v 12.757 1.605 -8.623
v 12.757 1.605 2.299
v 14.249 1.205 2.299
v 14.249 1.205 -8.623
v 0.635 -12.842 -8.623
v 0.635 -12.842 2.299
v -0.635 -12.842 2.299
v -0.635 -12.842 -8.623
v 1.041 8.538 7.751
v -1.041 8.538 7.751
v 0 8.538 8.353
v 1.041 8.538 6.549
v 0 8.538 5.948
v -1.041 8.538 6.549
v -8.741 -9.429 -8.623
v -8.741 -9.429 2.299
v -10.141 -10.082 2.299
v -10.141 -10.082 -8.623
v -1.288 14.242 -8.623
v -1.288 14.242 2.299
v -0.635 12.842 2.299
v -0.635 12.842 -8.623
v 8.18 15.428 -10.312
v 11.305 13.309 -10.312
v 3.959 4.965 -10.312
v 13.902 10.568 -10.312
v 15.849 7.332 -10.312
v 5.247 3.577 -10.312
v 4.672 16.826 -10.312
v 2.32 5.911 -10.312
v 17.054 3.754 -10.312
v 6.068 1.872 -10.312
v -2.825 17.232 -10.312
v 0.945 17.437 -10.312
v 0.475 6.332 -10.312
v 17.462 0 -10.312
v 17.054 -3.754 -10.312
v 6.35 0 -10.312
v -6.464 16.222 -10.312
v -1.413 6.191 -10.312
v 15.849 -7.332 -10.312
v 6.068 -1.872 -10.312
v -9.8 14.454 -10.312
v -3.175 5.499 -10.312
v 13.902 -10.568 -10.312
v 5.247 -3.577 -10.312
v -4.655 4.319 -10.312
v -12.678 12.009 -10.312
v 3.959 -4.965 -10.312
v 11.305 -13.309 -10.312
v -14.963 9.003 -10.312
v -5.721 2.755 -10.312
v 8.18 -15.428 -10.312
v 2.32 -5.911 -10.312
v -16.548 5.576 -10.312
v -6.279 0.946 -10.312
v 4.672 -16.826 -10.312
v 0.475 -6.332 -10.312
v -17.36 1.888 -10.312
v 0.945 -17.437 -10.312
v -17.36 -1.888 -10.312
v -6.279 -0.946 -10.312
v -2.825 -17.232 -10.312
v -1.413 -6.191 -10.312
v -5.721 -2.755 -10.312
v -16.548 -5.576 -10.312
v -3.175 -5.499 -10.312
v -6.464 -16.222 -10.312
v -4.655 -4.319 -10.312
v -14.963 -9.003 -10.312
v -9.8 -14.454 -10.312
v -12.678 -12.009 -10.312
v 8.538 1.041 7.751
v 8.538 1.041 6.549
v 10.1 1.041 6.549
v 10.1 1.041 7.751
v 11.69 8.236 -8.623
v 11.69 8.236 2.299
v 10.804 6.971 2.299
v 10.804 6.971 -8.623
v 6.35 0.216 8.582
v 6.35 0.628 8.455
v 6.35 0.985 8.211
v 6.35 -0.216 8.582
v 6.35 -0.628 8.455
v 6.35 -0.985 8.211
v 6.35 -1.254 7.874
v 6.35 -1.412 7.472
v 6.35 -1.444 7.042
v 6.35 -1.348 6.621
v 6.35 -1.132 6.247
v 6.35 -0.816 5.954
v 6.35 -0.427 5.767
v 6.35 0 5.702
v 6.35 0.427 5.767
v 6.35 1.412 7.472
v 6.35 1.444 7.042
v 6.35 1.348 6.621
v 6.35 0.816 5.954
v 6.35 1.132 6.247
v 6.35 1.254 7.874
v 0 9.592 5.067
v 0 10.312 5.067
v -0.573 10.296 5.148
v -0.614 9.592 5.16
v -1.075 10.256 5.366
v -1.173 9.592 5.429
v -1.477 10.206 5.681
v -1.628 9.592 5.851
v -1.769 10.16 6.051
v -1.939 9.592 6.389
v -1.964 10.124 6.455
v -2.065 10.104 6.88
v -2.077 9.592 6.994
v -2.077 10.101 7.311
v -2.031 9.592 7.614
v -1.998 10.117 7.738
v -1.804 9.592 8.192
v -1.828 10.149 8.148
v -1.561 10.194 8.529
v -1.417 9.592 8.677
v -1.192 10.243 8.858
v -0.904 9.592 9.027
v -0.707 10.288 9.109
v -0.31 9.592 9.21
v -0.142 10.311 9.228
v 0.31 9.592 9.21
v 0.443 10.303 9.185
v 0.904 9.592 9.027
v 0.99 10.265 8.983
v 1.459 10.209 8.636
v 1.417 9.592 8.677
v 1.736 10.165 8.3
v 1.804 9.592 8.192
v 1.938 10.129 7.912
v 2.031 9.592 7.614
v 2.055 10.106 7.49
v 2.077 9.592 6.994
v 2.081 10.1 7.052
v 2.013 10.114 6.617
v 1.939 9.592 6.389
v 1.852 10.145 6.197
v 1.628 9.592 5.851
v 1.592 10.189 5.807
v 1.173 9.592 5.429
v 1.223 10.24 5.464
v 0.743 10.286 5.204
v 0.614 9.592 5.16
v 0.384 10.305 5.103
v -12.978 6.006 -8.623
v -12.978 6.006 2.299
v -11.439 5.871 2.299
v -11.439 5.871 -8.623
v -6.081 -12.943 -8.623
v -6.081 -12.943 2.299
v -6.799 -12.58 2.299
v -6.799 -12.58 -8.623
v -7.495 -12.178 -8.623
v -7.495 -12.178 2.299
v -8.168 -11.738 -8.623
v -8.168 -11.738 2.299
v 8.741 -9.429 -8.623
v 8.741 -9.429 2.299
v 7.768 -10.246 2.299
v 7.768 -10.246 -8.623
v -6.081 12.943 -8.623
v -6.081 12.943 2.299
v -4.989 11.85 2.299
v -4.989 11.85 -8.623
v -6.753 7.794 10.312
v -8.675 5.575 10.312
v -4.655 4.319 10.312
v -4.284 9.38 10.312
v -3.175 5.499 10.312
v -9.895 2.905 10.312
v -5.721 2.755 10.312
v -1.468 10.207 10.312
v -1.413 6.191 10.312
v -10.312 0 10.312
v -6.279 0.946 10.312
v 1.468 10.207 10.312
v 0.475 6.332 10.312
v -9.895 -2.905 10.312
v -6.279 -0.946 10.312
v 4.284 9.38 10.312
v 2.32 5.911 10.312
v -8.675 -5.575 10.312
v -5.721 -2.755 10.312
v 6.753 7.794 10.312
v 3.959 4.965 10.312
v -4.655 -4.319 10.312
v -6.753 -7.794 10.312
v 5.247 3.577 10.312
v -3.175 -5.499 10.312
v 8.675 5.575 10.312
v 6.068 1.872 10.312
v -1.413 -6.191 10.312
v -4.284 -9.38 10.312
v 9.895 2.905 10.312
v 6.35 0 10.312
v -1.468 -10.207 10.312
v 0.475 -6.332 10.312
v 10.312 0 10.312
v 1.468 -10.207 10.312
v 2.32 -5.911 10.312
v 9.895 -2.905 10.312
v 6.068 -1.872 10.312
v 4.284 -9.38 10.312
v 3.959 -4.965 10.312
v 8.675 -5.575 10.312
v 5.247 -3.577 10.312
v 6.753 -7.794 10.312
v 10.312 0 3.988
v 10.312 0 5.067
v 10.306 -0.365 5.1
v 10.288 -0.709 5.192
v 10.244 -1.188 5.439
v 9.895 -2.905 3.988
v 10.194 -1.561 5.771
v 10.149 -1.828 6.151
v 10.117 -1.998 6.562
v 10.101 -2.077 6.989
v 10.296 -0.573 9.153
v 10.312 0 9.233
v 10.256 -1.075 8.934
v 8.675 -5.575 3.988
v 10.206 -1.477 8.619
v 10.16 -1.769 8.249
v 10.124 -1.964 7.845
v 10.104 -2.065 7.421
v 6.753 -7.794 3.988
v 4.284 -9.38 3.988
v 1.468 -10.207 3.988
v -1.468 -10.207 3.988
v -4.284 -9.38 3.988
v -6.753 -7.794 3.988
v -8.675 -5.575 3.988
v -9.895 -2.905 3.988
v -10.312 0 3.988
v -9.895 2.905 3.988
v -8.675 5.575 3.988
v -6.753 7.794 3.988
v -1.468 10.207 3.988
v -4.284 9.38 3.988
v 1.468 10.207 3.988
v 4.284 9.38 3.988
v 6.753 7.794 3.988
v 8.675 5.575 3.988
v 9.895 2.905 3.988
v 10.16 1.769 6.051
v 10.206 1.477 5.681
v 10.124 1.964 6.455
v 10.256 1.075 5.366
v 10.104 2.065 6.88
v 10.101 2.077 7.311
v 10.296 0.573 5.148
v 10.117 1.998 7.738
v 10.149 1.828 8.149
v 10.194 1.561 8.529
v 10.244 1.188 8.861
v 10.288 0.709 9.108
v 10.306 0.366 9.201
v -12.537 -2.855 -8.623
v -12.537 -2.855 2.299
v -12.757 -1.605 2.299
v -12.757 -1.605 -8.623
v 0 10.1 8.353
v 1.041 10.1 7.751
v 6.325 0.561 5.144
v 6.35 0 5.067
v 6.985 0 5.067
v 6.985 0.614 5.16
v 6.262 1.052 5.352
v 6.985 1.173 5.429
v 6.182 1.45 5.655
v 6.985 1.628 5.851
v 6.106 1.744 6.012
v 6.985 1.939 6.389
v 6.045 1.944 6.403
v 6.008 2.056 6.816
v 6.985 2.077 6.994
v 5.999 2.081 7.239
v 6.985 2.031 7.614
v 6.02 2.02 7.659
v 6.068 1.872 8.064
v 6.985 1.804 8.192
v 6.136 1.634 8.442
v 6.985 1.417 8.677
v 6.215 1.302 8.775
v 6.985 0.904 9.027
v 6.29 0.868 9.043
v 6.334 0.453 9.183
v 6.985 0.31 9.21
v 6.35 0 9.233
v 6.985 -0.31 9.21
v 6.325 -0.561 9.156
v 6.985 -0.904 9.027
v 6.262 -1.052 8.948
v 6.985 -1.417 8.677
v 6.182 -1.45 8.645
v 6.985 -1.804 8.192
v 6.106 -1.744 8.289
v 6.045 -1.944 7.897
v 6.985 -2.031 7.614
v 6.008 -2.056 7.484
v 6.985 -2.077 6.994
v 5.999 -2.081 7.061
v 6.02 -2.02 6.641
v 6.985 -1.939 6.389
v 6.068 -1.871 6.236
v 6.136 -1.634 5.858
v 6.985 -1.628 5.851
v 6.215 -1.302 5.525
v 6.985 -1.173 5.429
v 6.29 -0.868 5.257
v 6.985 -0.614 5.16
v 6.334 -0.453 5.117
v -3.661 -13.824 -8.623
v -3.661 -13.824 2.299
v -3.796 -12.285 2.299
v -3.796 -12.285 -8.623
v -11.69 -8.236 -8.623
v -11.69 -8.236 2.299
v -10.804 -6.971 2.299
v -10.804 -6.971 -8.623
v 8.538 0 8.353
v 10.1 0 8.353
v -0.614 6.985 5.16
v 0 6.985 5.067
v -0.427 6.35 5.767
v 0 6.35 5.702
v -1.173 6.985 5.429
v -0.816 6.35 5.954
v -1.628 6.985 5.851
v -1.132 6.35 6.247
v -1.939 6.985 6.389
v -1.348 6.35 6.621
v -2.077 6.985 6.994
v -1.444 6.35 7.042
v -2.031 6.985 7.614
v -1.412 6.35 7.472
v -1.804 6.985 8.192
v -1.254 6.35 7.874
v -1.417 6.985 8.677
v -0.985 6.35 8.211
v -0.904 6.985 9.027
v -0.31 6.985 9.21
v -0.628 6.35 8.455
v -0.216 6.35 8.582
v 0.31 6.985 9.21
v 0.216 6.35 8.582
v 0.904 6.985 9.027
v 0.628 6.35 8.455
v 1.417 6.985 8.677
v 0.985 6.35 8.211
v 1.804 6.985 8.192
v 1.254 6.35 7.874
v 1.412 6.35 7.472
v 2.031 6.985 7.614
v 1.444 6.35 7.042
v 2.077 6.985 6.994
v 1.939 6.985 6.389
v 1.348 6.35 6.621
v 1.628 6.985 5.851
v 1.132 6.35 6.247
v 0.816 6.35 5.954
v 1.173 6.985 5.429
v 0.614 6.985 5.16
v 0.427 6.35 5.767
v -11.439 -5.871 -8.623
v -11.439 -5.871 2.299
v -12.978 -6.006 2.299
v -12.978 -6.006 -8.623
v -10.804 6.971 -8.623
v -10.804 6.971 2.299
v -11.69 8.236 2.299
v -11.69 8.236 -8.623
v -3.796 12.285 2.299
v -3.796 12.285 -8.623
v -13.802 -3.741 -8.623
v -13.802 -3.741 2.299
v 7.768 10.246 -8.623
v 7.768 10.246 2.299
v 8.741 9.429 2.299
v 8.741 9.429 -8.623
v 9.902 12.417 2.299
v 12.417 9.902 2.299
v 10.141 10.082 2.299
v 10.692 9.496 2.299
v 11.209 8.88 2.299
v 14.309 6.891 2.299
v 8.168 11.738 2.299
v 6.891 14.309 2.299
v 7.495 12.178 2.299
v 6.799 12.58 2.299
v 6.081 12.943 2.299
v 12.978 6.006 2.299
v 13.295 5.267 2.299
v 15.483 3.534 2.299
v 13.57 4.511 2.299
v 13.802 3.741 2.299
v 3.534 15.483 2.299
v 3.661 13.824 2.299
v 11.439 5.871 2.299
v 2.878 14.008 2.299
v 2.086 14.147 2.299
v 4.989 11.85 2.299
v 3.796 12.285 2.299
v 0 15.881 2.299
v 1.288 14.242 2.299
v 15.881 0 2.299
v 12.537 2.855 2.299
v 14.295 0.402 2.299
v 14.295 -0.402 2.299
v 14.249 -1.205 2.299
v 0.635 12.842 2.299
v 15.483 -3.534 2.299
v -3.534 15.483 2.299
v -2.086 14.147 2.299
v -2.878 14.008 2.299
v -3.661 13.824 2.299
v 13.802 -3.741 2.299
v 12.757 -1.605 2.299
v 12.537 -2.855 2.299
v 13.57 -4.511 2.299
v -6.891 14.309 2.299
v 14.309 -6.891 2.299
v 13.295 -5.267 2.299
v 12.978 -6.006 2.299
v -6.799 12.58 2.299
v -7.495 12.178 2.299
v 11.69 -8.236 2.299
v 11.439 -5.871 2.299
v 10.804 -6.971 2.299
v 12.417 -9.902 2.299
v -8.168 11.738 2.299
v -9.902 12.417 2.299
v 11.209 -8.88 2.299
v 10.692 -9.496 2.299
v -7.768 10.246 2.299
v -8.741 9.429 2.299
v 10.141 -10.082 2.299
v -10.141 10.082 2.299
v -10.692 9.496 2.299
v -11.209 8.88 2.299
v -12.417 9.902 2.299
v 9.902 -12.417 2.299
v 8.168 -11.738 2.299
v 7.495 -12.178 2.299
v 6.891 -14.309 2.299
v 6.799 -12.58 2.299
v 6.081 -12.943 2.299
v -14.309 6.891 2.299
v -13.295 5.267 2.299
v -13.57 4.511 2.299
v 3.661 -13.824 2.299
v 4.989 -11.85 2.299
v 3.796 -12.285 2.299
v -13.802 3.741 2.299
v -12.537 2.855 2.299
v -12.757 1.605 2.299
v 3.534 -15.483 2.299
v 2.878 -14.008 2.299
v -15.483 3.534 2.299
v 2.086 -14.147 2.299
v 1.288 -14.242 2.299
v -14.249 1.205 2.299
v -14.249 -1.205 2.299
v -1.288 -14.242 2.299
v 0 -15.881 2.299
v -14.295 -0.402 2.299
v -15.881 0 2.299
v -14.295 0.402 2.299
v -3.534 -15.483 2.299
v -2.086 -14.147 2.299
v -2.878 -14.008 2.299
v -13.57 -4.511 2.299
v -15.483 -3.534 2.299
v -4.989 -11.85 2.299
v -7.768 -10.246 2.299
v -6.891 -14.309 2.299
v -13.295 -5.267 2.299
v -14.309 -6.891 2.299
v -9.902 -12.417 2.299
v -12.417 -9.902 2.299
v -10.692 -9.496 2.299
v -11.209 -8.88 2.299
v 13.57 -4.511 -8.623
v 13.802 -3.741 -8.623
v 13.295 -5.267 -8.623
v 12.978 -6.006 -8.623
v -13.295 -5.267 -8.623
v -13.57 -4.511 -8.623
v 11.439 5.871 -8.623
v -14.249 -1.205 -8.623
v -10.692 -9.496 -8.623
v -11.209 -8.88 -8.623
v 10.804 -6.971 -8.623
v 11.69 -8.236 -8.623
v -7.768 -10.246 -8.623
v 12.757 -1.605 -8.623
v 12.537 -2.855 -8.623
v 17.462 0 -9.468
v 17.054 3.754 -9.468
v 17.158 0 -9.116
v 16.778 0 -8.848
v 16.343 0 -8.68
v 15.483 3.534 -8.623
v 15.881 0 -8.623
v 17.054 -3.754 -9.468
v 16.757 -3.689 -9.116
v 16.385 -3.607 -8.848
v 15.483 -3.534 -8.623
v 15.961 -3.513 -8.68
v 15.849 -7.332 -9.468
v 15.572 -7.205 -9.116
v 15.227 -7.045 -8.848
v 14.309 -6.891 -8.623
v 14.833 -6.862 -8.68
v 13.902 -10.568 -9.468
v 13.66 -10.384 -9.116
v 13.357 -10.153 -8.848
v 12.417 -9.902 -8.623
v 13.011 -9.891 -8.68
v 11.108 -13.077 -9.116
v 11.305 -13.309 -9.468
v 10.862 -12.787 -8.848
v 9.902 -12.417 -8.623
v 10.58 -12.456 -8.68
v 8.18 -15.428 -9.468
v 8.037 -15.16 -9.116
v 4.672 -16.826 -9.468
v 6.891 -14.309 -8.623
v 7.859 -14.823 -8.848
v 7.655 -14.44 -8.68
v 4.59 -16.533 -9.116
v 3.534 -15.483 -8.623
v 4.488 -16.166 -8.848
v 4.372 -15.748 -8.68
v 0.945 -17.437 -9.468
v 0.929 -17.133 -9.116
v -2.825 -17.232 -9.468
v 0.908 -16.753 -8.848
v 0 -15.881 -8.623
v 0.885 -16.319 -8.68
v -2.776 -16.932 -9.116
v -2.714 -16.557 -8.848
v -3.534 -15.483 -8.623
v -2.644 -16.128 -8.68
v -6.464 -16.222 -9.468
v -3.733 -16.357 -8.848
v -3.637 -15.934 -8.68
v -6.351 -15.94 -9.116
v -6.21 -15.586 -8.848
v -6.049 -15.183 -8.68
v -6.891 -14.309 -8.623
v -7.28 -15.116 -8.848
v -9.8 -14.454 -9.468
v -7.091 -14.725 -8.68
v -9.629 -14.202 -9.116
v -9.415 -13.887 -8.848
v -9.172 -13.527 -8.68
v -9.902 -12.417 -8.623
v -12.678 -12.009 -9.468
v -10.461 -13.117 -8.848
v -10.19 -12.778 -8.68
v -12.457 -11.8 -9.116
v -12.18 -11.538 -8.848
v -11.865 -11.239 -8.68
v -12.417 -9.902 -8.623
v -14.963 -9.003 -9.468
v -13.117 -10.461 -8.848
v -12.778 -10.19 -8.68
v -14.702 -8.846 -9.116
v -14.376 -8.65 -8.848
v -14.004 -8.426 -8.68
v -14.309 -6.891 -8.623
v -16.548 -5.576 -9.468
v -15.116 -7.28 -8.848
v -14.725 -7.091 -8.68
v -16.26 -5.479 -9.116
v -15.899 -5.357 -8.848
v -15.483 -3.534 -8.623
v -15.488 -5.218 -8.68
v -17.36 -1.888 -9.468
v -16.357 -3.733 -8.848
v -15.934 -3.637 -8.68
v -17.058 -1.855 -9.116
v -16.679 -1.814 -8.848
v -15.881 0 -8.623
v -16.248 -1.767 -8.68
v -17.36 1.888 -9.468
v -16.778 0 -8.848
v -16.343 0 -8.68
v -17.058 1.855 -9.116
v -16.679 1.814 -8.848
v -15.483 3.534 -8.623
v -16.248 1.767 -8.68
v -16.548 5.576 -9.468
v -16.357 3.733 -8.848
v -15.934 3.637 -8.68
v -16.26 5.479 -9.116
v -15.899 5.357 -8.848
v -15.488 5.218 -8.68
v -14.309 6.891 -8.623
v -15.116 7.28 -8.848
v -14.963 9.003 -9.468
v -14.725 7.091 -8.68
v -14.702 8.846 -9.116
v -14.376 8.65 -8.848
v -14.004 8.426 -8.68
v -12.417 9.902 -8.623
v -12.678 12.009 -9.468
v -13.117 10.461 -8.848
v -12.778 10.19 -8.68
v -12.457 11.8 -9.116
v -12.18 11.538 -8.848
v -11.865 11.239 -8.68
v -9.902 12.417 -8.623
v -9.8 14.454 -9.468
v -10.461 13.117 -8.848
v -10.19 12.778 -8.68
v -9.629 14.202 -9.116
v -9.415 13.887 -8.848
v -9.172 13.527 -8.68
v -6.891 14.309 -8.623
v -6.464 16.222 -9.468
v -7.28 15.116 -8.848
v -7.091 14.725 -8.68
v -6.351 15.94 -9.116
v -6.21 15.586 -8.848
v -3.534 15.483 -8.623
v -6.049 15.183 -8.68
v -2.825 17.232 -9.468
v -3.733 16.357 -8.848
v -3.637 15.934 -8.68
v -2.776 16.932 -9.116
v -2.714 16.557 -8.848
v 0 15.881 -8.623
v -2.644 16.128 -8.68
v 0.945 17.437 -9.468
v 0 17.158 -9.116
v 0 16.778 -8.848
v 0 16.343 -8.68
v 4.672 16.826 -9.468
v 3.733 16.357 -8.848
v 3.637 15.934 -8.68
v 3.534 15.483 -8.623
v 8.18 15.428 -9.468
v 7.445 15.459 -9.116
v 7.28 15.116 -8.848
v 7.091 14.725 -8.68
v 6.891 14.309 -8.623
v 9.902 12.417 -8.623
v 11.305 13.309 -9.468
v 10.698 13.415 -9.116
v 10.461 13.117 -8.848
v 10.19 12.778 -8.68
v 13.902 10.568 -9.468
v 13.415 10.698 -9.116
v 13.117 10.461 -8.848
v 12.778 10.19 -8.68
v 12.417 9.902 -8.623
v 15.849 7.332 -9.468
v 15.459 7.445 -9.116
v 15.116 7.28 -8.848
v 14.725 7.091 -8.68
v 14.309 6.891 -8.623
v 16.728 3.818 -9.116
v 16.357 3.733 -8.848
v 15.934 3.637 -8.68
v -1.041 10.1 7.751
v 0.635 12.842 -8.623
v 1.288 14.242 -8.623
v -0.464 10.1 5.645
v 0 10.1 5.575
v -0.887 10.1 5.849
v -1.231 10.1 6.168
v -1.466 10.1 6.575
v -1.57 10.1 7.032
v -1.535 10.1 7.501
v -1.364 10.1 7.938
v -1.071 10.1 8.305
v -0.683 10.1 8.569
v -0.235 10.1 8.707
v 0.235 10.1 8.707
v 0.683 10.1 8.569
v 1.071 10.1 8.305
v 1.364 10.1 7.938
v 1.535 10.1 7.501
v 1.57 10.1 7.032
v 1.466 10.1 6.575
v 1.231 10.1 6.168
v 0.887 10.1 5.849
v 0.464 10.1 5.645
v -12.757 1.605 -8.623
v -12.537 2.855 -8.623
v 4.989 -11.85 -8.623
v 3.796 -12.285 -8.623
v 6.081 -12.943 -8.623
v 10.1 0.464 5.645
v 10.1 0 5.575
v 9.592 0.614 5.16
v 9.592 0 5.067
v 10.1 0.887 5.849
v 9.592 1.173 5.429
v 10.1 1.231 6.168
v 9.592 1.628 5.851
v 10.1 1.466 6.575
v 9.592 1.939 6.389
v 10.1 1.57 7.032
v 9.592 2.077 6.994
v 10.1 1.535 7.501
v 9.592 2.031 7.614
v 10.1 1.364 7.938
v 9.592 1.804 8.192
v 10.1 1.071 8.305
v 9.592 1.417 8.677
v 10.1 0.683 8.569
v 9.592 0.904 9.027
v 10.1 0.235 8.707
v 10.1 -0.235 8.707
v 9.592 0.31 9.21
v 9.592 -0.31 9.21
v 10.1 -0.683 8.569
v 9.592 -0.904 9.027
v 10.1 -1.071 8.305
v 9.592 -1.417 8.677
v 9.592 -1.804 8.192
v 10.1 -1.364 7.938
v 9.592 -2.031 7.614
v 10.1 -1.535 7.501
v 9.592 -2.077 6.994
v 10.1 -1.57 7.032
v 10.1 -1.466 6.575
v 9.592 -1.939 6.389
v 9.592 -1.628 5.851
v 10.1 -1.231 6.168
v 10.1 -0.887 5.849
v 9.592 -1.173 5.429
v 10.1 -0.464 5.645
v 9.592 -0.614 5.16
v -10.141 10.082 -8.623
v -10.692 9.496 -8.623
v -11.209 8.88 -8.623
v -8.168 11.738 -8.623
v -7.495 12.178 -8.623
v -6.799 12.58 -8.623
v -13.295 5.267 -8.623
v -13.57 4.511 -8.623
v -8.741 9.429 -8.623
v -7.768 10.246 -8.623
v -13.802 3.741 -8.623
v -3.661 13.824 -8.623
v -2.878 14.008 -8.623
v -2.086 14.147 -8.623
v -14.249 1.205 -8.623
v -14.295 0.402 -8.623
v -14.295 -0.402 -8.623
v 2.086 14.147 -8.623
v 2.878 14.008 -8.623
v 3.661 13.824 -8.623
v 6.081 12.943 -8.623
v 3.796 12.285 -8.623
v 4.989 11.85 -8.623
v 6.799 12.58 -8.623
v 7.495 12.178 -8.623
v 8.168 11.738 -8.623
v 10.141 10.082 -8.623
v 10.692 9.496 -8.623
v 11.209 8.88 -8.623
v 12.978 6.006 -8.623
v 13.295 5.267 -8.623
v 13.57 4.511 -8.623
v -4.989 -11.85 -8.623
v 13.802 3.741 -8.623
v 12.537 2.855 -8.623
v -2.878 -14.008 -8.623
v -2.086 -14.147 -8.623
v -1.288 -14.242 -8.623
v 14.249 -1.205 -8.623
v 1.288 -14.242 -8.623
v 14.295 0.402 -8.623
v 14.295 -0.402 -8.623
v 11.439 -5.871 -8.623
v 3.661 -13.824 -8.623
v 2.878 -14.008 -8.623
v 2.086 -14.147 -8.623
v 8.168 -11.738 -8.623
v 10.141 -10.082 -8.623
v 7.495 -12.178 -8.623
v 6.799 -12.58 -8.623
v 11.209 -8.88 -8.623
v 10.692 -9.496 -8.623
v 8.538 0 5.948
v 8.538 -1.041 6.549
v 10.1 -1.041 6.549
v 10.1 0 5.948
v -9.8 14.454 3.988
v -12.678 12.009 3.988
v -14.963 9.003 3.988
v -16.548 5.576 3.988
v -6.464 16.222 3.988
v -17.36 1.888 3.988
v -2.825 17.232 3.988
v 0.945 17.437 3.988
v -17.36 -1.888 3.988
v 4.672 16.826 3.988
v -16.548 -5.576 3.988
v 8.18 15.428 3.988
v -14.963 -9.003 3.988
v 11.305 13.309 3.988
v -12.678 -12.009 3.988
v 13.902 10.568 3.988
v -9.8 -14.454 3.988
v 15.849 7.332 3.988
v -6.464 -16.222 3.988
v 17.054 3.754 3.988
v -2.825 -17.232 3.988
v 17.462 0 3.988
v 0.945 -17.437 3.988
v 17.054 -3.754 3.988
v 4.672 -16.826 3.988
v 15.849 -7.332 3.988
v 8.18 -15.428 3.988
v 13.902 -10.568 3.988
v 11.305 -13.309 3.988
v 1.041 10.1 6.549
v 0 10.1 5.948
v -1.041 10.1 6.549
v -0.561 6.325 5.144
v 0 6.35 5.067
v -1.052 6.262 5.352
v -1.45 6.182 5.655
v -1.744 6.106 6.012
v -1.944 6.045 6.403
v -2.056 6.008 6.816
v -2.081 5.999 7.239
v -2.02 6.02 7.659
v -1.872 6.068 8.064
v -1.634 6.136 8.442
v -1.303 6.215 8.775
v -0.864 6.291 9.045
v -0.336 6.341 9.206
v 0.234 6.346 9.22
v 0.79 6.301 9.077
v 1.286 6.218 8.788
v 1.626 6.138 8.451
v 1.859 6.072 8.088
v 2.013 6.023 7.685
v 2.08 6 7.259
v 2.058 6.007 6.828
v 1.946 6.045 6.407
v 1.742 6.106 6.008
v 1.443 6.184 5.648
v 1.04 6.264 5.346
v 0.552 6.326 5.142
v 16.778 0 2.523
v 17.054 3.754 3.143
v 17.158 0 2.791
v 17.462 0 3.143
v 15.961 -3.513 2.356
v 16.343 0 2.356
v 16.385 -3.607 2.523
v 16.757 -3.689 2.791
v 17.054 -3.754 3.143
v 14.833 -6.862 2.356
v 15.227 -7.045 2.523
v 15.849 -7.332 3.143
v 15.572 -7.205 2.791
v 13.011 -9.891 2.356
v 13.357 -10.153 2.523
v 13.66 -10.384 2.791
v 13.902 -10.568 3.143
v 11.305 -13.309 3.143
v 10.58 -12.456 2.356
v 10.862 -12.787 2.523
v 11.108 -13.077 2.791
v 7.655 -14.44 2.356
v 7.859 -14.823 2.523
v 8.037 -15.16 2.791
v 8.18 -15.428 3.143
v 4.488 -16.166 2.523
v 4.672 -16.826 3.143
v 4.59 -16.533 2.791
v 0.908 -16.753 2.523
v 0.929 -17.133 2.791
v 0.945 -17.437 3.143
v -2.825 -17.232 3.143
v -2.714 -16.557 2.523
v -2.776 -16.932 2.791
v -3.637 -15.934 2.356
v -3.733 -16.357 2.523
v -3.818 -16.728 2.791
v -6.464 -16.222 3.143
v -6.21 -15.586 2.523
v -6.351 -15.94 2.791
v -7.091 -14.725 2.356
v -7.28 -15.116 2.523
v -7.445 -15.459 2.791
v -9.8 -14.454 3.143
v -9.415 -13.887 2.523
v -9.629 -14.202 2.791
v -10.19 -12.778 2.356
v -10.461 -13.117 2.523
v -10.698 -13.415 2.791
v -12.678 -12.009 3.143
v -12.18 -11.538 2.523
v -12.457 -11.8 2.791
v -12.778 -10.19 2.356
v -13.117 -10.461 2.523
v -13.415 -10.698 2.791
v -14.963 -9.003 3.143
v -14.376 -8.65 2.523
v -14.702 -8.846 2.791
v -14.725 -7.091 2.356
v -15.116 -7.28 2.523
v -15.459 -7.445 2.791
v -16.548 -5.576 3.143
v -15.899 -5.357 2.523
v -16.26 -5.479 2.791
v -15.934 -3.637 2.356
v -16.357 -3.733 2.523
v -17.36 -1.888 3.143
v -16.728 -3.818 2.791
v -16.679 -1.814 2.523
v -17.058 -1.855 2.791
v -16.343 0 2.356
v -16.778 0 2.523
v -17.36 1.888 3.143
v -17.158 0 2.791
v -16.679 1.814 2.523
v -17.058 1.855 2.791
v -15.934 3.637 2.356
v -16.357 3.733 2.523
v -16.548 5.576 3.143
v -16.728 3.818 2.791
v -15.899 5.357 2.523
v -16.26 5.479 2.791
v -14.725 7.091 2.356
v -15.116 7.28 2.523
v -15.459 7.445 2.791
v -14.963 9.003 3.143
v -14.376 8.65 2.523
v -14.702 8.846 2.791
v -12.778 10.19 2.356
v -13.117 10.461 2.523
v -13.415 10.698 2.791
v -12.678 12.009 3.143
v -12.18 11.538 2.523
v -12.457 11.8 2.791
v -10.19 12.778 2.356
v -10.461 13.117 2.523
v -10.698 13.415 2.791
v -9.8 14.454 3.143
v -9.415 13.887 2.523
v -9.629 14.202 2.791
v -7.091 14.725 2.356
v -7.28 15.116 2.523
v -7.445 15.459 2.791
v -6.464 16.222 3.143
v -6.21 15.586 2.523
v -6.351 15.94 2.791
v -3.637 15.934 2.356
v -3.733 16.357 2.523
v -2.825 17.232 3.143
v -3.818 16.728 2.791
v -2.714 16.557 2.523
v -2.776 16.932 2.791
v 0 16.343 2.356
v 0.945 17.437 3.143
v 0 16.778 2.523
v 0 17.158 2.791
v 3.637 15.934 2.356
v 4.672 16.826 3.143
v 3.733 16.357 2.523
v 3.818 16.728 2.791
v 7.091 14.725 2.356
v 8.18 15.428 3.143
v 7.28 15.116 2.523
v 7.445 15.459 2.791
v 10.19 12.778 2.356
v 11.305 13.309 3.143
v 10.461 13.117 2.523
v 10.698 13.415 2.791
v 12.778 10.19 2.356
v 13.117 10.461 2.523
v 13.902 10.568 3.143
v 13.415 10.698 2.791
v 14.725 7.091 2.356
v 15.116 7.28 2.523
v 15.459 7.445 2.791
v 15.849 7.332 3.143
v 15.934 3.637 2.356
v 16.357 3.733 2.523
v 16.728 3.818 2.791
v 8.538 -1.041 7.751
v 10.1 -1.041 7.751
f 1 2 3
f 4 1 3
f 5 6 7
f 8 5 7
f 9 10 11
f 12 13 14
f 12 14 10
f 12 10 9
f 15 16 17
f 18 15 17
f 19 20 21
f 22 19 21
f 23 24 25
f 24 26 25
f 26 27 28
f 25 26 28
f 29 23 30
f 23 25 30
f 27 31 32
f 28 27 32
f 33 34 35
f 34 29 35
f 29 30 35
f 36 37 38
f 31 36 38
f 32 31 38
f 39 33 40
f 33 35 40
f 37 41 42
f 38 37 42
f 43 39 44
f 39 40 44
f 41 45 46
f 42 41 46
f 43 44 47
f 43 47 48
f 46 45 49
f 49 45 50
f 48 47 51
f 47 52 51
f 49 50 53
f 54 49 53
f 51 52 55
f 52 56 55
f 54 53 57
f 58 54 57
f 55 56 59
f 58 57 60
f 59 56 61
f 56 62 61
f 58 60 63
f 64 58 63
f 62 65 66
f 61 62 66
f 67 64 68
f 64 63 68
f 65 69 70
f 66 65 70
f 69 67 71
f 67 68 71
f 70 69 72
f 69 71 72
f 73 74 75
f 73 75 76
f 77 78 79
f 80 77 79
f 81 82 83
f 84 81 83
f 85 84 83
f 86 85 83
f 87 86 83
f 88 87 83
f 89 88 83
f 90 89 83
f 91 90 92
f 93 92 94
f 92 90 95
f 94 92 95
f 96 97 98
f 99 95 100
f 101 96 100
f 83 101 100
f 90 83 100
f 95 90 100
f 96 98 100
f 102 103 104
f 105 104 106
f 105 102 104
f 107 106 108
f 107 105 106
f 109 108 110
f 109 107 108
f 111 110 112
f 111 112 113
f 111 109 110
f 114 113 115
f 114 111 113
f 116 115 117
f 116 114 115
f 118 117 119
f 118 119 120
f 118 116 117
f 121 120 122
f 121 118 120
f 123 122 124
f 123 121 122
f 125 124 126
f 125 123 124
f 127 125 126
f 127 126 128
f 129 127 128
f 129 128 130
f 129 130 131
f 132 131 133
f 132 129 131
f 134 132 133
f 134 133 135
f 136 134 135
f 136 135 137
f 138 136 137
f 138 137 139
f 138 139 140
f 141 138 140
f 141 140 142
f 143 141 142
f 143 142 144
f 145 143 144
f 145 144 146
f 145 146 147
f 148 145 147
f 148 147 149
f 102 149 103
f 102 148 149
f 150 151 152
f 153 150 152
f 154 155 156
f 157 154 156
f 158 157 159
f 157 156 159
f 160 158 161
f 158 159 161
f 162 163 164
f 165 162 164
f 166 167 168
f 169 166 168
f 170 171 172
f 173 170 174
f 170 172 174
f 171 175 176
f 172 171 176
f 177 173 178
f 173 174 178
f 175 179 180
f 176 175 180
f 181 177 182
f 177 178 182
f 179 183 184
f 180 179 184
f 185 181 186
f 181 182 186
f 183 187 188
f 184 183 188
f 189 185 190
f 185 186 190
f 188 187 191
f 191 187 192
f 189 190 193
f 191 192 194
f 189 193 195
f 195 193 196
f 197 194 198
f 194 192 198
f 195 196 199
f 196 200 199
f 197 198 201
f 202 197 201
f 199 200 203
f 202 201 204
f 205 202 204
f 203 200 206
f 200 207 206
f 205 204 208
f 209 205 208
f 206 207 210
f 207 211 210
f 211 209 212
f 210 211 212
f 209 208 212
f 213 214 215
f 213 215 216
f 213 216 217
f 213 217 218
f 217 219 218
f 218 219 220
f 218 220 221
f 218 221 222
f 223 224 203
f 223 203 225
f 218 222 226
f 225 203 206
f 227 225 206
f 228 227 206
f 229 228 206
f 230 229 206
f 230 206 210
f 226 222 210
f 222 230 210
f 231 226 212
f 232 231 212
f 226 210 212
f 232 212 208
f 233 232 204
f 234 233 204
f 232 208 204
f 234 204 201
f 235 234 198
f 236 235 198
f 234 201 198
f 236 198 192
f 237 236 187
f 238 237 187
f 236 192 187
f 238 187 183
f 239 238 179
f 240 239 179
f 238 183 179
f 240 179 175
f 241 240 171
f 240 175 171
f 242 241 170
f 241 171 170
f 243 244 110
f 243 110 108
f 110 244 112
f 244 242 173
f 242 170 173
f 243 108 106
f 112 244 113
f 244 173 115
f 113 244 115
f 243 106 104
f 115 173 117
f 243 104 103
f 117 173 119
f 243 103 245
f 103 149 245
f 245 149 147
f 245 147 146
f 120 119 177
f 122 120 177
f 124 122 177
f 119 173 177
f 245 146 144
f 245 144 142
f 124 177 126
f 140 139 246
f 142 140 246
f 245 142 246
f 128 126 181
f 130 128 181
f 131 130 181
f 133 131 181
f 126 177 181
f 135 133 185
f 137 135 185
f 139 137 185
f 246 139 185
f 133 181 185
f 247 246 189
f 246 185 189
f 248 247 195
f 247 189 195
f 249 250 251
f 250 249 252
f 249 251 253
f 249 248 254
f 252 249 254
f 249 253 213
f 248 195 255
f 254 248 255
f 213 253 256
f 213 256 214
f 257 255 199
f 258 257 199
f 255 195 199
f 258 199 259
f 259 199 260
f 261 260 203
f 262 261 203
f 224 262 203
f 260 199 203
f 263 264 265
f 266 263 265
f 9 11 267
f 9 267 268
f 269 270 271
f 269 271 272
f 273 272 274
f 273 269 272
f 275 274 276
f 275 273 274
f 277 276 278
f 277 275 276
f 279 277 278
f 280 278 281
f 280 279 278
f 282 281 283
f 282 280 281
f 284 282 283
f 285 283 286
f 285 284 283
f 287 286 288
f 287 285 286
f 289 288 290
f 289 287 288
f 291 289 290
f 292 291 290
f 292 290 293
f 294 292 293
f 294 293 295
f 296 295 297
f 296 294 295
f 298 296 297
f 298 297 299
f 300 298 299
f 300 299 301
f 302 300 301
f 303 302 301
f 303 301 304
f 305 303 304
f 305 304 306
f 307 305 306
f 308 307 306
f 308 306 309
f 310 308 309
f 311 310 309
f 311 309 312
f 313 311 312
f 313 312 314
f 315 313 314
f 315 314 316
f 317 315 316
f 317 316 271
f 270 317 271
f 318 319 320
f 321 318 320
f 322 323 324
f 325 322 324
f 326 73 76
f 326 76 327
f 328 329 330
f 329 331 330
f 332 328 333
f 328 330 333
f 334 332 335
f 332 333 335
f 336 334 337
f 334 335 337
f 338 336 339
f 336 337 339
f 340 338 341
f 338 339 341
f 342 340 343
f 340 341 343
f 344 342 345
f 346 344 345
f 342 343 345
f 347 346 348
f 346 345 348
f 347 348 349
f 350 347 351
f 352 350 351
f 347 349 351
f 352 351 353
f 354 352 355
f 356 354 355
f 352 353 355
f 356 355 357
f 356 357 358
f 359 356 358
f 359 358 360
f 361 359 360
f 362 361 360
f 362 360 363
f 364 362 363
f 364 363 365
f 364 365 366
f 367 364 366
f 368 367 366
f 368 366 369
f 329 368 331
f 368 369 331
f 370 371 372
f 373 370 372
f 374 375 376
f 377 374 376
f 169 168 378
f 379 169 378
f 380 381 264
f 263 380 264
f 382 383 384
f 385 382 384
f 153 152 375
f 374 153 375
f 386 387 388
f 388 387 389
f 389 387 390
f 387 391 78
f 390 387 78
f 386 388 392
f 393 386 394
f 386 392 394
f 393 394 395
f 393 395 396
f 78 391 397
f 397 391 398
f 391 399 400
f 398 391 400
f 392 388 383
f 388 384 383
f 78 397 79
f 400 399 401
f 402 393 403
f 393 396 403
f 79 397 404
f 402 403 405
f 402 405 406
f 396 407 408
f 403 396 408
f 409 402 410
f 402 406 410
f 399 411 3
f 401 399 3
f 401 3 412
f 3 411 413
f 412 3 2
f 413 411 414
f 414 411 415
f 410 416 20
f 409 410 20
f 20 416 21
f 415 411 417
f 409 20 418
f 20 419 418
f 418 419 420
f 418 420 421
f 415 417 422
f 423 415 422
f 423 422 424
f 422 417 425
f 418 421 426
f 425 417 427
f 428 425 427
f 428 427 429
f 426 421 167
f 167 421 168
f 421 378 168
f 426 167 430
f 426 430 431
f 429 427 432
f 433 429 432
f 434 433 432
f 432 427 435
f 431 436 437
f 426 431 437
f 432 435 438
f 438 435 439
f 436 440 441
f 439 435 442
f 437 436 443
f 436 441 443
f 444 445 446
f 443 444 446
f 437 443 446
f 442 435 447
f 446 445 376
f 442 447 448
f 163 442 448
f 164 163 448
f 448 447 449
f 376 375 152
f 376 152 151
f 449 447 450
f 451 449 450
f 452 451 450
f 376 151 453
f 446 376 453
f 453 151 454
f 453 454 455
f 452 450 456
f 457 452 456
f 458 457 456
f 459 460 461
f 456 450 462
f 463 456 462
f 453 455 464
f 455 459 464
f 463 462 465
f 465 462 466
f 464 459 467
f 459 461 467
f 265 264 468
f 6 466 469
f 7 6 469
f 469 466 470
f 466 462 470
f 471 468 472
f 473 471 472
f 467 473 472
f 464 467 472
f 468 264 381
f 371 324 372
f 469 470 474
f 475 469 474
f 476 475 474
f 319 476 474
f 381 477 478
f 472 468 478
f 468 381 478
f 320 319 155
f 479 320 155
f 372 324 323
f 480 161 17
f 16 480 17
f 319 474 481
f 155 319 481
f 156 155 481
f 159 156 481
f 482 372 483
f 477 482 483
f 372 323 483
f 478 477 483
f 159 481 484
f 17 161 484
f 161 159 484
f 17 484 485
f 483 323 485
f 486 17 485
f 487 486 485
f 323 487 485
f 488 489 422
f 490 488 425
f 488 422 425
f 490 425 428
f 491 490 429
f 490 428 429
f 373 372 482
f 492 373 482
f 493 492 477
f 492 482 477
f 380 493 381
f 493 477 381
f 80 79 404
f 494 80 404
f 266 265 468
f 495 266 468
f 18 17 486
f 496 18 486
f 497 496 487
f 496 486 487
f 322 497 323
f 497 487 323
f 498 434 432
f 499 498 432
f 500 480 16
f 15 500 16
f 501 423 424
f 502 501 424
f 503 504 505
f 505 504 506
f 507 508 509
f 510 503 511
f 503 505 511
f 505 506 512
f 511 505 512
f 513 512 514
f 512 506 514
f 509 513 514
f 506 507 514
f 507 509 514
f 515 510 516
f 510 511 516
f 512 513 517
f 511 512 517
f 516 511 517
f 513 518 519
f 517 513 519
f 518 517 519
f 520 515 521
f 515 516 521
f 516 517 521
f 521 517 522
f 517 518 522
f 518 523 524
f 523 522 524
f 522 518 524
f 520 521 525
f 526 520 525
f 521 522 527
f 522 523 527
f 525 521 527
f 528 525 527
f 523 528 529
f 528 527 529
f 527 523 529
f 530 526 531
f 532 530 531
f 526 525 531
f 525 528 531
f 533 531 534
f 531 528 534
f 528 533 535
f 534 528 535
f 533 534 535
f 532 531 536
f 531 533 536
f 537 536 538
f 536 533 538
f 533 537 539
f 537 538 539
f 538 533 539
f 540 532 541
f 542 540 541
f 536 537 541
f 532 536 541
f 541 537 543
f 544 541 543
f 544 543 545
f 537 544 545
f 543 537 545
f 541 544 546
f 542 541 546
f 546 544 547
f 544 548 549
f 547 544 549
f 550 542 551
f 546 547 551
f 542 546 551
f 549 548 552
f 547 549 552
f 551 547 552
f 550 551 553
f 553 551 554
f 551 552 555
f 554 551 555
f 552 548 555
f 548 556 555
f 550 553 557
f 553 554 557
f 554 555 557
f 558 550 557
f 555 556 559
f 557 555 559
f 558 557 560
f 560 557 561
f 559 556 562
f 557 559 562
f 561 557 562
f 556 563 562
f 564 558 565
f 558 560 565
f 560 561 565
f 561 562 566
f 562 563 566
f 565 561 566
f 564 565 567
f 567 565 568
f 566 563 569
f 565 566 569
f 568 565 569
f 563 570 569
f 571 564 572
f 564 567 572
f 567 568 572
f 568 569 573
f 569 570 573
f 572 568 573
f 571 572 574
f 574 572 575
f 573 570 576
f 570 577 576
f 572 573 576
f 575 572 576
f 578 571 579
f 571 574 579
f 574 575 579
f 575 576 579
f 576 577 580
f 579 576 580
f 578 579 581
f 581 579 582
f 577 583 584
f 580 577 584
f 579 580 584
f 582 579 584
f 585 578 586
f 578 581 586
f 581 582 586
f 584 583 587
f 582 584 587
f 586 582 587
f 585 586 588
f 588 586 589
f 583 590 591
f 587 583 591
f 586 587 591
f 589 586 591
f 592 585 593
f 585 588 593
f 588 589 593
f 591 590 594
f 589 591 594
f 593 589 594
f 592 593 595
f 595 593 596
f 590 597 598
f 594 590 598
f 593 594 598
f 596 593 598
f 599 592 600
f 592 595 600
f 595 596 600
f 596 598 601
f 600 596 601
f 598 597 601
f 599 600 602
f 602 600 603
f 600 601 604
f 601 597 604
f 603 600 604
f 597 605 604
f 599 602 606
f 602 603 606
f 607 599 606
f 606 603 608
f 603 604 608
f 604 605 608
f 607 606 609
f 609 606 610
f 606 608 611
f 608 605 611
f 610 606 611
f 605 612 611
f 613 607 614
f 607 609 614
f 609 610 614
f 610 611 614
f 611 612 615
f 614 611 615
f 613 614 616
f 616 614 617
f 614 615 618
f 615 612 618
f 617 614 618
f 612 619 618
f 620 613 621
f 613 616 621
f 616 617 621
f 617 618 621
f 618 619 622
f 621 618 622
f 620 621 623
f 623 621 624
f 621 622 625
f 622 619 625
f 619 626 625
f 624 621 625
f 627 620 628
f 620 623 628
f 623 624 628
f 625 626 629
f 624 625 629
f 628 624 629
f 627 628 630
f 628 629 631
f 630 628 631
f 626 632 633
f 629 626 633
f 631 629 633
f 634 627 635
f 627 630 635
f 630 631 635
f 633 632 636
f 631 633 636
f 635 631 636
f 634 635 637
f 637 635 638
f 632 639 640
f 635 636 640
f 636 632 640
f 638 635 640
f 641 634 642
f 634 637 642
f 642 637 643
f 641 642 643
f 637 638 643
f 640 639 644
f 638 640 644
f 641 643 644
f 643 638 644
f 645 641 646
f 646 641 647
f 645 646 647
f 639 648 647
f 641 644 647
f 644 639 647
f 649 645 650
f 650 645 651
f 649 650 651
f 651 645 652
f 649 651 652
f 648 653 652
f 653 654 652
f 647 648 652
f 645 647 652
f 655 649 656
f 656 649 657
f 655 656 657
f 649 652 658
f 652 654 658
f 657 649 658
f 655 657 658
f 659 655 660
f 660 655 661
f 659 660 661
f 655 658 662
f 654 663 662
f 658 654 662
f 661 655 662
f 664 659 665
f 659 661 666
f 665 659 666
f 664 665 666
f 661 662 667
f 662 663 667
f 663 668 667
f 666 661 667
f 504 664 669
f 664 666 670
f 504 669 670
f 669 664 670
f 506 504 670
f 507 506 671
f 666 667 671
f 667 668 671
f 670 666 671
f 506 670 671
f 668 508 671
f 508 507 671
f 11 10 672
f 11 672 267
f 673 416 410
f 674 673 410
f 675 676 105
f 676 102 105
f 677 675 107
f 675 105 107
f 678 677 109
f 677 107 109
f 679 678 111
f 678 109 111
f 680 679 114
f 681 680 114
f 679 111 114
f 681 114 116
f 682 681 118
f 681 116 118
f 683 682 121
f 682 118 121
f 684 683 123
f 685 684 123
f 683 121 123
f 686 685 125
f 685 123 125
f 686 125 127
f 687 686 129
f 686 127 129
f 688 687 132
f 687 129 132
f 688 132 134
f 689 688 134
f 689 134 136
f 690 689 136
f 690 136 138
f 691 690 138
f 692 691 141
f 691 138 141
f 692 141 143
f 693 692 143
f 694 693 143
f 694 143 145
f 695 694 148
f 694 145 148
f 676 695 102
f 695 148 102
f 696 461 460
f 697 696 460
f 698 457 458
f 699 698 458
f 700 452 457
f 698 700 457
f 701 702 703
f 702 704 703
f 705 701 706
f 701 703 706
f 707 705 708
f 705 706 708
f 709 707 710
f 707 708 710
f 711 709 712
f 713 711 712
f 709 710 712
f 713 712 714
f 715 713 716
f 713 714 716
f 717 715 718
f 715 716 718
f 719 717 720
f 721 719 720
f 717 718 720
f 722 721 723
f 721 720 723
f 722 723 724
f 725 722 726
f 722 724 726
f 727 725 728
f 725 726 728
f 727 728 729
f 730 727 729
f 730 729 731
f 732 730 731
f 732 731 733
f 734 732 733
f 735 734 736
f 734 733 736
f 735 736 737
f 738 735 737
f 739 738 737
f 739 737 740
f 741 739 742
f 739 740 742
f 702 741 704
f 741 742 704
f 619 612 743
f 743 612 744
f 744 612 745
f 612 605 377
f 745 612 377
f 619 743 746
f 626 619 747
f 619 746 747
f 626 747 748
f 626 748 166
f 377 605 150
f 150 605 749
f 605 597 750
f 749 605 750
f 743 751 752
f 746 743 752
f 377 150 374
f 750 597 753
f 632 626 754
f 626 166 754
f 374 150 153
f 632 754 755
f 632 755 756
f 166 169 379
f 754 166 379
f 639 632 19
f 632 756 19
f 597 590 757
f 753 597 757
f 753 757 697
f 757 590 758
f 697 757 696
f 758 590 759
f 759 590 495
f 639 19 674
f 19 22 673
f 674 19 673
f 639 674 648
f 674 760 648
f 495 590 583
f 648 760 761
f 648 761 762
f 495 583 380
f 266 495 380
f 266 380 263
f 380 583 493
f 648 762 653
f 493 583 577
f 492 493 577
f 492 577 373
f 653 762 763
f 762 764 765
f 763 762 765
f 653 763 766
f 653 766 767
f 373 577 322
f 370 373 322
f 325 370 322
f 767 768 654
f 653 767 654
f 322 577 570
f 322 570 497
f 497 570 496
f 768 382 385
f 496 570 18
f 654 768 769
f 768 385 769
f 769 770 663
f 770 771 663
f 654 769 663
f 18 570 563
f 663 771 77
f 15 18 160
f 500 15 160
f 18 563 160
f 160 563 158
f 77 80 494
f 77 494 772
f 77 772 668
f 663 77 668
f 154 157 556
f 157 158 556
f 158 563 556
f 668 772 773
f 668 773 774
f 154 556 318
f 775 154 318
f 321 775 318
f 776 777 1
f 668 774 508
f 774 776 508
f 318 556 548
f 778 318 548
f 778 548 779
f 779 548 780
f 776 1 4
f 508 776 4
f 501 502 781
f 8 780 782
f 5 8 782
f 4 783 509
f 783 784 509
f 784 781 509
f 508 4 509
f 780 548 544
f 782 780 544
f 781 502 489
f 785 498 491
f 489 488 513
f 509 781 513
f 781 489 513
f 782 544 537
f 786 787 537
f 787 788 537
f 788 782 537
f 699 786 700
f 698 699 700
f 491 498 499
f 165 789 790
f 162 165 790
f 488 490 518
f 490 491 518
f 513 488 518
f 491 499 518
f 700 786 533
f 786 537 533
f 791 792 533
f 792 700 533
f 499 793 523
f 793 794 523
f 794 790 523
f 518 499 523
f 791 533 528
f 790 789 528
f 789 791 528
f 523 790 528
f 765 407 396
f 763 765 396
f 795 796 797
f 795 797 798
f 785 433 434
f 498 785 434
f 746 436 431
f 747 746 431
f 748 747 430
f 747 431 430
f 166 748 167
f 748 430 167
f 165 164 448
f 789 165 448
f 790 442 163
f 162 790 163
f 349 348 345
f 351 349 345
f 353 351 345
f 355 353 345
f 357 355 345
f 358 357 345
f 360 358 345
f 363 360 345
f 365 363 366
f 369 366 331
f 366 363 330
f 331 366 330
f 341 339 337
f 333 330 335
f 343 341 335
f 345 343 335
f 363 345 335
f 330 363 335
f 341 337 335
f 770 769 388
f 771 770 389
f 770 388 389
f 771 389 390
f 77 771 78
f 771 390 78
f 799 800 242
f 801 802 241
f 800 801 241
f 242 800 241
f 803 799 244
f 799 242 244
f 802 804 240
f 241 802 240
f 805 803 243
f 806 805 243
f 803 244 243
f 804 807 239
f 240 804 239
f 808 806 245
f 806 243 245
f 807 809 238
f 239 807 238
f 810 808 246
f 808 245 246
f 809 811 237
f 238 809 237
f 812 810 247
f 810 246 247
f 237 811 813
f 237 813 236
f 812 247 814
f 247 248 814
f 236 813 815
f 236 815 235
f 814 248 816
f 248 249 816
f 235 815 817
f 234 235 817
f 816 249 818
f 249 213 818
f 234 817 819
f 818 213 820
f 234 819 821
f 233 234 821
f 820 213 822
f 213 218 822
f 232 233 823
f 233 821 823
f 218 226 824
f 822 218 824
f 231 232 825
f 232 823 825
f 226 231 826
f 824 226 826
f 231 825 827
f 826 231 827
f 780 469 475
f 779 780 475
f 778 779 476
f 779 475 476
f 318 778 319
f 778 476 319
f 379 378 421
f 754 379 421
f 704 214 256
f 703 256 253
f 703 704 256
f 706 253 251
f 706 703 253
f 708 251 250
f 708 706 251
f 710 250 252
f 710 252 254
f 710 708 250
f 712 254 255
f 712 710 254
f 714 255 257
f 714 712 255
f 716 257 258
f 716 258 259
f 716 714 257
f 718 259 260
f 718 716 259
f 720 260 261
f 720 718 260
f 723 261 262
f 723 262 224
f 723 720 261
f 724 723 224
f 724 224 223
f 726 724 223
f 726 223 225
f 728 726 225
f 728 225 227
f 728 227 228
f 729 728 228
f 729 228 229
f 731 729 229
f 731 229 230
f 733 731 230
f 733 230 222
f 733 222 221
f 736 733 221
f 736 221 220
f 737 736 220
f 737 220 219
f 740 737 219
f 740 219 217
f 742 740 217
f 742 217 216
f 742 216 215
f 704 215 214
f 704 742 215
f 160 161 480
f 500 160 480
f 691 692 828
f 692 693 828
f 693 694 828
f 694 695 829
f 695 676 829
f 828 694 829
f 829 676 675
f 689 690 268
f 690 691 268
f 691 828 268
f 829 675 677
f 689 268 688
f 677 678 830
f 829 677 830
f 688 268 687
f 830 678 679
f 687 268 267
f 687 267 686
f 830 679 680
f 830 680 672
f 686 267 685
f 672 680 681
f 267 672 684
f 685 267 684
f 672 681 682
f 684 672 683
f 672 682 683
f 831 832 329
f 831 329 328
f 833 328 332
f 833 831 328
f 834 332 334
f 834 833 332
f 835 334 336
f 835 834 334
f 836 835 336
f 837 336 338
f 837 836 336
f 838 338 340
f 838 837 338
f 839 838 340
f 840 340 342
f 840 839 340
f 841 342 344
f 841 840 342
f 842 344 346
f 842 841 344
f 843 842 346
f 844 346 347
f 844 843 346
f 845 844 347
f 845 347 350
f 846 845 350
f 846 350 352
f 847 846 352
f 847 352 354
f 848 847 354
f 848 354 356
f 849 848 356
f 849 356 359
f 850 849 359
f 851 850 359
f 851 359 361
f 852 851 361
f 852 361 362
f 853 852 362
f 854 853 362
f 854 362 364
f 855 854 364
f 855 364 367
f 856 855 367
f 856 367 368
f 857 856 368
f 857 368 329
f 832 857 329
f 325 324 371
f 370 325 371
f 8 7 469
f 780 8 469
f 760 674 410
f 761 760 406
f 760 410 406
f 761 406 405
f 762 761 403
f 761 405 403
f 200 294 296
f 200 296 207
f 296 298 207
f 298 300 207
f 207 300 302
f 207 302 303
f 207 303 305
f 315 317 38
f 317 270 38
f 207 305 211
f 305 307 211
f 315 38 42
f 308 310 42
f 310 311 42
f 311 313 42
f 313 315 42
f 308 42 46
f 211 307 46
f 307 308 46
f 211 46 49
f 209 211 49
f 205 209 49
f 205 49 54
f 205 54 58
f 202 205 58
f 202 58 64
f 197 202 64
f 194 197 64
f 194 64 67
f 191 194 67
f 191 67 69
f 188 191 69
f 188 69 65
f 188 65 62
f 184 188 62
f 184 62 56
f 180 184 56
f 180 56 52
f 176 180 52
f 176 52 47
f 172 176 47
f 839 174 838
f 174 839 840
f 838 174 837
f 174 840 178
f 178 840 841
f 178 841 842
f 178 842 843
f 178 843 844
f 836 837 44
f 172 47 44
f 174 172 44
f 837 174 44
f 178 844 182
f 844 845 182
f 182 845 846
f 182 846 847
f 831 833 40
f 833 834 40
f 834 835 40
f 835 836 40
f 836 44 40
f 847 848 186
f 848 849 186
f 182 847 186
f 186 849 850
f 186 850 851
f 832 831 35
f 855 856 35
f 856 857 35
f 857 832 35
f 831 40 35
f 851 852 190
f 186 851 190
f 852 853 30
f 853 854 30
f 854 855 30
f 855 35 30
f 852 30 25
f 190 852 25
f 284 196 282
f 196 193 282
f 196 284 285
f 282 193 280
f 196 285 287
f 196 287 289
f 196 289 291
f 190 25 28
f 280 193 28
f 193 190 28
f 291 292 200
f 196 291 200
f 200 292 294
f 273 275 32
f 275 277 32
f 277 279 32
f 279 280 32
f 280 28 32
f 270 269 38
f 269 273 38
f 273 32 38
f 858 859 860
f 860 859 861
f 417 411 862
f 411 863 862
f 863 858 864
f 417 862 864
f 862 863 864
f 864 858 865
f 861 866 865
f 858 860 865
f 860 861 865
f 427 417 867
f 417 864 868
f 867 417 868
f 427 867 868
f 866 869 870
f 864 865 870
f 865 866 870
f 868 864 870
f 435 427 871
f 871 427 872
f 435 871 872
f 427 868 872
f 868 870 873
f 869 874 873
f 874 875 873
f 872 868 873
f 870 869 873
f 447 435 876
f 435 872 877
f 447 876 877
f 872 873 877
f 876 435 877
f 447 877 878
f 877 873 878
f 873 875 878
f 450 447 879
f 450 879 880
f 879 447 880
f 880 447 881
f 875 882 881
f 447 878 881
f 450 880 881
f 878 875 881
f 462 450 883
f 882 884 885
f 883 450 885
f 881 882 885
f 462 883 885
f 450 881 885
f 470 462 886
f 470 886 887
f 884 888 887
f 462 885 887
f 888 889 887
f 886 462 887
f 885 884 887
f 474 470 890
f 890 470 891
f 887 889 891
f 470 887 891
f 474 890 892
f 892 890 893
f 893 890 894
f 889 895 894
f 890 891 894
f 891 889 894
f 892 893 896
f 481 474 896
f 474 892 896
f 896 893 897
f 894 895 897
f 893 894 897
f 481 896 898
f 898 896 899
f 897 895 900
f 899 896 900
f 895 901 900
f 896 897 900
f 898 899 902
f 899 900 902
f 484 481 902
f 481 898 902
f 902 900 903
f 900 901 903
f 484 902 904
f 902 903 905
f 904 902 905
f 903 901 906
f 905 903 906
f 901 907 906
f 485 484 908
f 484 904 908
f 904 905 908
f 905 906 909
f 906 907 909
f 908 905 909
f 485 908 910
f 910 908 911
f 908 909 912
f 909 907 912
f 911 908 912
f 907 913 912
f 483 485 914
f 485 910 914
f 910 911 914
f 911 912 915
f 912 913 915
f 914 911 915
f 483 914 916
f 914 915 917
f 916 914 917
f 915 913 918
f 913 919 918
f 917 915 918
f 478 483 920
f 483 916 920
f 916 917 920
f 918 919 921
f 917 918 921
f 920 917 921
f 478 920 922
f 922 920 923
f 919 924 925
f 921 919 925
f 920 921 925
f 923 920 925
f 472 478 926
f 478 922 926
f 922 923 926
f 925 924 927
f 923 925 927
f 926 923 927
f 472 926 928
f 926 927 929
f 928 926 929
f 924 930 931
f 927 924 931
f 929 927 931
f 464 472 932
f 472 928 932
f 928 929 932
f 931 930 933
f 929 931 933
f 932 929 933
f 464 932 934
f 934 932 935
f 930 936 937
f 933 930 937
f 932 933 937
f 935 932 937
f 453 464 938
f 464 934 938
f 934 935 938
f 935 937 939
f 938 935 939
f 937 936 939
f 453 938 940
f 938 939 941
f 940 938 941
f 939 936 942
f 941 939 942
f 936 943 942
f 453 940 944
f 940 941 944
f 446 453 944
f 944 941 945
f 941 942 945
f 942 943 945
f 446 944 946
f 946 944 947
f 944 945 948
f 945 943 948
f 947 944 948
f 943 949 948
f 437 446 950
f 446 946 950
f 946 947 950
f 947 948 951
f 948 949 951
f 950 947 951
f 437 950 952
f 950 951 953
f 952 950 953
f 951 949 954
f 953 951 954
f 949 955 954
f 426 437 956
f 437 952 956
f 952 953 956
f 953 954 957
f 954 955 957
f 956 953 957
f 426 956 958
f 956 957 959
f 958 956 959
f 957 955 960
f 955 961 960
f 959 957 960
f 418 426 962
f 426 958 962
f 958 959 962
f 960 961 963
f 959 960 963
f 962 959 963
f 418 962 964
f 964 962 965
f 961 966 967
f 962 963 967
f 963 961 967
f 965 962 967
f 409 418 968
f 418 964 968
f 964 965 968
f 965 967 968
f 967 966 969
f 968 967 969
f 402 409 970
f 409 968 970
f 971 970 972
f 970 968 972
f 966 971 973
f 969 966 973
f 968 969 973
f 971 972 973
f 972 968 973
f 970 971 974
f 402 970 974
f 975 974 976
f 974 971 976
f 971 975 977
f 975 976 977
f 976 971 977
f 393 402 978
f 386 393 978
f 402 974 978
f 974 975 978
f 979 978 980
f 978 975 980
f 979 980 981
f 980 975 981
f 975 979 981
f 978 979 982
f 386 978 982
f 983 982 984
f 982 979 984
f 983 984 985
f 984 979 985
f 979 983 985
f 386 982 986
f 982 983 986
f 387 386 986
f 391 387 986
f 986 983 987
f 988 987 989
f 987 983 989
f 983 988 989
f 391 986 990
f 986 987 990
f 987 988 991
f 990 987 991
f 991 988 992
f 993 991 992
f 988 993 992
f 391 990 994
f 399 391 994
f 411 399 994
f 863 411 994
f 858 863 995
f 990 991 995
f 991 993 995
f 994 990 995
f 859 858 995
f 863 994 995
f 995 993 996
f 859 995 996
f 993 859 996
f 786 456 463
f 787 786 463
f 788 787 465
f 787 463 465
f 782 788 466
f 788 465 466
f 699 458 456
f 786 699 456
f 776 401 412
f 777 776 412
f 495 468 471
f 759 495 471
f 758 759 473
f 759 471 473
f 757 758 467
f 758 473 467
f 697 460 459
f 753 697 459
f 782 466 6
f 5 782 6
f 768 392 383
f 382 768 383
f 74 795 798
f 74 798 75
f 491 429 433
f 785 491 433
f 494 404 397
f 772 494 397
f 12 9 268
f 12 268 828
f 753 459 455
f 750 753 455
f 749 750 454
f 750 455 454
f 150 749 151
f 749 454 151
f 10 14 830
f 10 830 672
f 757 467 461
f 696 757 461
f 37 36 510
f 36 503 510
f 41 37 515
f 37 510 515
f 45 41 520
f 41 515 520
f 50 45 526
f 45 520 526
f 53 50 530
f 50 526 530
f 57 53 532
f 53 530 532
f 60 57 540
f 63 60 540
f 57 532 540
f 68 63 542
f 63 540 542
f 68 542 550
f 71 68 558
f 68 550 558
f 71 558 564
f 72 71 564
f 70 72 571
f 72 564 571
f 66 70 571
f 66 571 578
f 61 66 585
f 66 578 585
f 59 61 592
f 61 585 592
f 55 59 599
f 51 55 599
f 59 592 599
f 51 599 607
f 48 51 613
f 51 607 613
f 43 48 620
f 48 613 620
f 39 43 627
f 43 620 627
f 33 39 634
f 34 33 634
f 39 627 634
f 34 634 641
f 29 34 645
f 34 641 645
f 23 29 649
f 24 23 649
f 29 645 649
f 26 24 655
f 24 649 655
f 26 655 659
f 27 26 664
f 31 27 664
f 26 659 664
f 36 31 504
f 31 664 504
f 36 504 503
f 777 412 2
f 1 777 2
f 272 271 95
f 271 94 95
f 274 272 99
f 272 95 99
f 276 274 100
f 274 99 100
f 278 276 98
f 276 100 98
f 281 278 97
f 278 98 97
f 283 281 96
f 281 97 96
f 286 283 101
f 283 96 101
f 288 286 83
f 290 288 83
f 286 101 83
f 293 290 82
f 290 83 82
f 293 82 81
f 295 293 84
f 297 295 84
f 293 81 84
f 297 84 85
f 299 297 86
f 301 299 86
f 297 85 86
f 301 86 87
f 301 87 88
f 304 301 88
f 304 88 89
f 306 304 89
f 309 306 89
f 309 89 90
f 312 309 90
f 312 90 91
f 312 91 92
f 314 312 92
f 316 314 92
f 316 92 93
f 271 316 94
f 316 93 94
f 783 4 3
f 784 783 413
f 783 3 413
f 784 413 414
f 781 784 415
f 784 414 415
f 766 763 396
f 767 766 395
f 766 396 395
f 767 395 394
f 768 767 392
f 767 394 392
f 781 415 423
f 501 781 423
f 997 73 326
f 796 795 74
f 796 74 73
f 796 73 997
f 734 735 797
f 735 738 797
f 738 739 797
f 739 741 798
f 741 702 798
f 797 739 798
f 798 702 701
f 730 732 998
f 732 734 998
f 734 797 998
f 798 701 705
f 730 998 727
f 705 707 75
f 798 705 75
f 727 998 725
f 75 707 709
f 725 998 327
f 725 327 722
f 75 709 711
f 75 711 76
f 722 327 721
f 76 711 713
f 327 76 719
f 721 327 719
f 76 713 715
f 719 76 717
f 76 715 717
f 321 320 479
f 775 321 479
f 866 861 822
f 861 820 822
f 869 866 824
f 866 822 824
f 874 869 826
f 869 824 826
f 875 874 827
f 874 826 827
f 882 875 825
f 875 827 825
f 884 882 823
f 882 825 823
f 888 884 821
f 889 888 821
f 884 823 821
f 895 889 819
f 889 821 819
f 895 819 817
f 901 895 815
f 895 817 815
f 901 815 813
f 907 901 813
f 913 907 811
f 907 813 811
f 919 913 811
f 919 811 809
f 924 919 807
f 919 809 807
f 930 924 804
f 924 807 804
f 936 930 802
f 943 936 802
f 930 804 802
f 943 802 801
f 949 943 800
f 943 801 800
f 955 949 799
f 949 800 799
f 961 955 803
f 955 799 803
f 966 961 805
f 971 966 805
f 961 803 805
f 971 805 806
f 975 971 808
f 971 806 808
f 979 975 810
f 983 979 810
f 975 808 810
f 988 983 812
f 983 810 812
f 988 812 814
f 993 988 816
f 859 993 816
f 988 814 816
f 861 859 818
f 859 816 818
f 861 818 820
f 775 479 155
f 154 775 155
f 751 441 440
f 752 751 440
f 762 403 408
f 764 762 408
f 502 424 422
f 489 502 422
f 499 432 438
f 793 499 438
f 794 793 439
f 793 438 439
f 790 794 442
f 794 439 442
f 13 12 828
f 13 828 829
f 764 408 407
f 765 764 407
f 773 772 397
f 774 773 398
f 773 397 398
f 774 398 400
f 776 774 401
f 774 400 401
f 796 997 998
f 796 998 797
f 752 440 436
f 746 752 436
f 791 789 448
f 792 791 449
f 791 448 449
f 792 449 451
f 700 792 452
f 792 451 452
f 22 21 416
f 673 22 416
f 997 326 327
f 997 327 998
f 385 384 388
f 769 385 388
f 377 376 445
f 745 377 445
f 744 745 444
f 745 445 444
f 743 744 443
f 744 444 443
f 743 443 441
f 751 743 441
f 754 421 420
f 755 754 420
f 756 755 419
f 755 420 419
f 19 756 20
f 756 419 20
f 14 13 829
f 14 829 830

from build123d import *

# Parameters (mm, degrees)
CUT_EXTRUDE1_START = 2.2987
CUT_EXTRUDE1_DEPTH = 10.922
CIRPATTERN1_COUNT  = 18
SKETCH4_R          = 2.0828
CUT_EXTRUDE2_DEPTH = 27.762350537
CUT_EXTRUDE3_DEPTH = 1.5621
CIRPATTERN2_COUNT  = 2
CIRPATTERN2_ANGLE  = 90


with BuildPart() as part:
    # Sketch2 → Revolve1 (revolve)
    with BuildSketch(Plane(origin=(0, 0, 0), x_dir=(0, 0, -1), z_dir=(1, 0, 0)), mode=Mode.PRIVATE) as revolve1_sk:
        with BuildLine():
            Line((-10.3124, 6.35), (10.3124, 6.35))
            Line((10.3124, 6.35), (10.3124, 17.4625))
            Line((10.3124, 17.4625), (9.46785, 17.4625))
            ThreePointArc((9.46785, 17.4625), (8.847668679, 16.777633999), (8.6233, 15.88135))
            Line((8.6233, 15.88135), (8.6233, 14.3002))
            Line((8.6233, 14.3002), (-2.2987, 14.3002))
            Line((-2.2987, 14.3002), (-2.2987, 15.88135))
            ThreePointArc((-2.2987, 15.88135), (-2.523068679, 16.777633999), (-3.14325, 17.4625))
            Line((-3.14325, 17.4625), (-3.9878, 17.4625))
            Line((-3.9878, 17.4625), (-3.9878, 10.3124))
            Line((-3.9878, 10.3124), (-10.3124, 10.3124))
            Line((-10.3124, 10.3124), (-10.3124, 6.35))
        make_face()
    revolve(revolve1_sk.sketch.rotate(Axis((0, 0, 10.3124), (0, 0, -1)), 90), axis=Axis((0, 0, 10.3124), (0, 0, -1)))

    # Sketch3 → Cut-Extrude1 (cut)
    with BuildSketch(Plane.XY.offset(CUT_EXTRUDE1_START)):
        with BuildLine():
            Line((-0.635, 12.842092967), (0.635, 12.842092967))
            Line((0.635, 12.842092967), (1.287830721, 14.242092967))
            ThreePointArc((1.287830721, 14.242092967), (0, 14.3002), (-1.287830721, 14.242092967))
            Line((-1.287830721, 14.242092967), (-0.635, 12.842092967))
        make_face()
    cut_extrude1 = extrude(amount=-CUT_EXTRUDE1_DEPTH, mode=Mode.SUBTRACT)

    # CirPattern1: Cut-Extrude1 ×18 about axis
    cirpattern1_axis = Axis((0, 0, 0), (0, 0, 1))
    for i in range(1, CIRPATTERN1_COUNT):
        add(cut_extrude1.rotate(cirpattern1_axis, i * 360 / CIRPATTERN1_COUNT), mode=Mode.SUBTRACT)

    # Sketch4 → Cut-Extrude2 (cut, through all)
    with BuildSketch(Plane(origin=(0, 0, 0), x_dir=(1, 0, 0), z_dir=(0, 1, 0))):
        with Locations(Location((0, -7.1501, 0), (0, 0, 90))):
            Circle(SKETCH4_R)
    cut_extrude2 = extrude(amount=CUT_EXTRUDE2_DEPTH, mode=Mode.SUBTRACT)

    # Sketch5 → Revolve2 (revolve)
    with BuildSketch(Plane.XY.offset(7.1501), mode=Mode.PRIVATE) as revolve2_sk:
        Polygon((1.5748, 10.099878114), (2.0828, 9.591878114), (2.0828, 6.985), (1.4478, 6.35), (0, 6.35), (0, 10.099878114), align=None)
    revolve2 = revolve(revolve2_sk.sketch.rotate(Axis((0, 0, 7.1501), (0, 1, 0)), 90), axis=Axis((0, 0, 7.1501), (0, 1, 0)))

    # Sketch6 → Cut-Extrude3 (cut)
    with BuildSketch(Plane(origin=(0, 10.099878114, 0), x_dir=(1, 0, 0), z_dir=(0, 1, 0))):
        Polygon((0, -5.947594859), (-1.0414, -6.54884743), (-1.0414, -7.75135257), (0, -8.352605141), (1.0414, -7.75135257), (1.0414, -6.54884743), align=None)
    cut_extrude3 = extrude(amount=-CUT_EXTRUDE3_DEPTH, mode=Mode.SUBTRACT)

    # CirPattern2: Cut-Extrude2, Revolve2, Cut-Extrude3 ×2 about axis
    cirpattern2_axis = Axis((0, 0, 0), (0, 0, -1))
    add([cut_extrude2.rotate(cirpattern2_axis, i * CIRPATTERN2_ANGLE / (CIRPATTERN2_COUNT - 1)) for i in range(1, CIRPATTERN2_COUNT)], mode=Mode.SUBTRACT)
    add([revolve2.rotate(cirpattern2_axis, i * CIRPATTERN2_ANGLE / (CIRPATTERN2_COUNT - 1)) for i in range(1, CIRPATTERN2_COUNT)])
    add([cut_extrude3.rotate(cirpattern2_axis, i * CIRPATTERN2_ANGLE / (CIRPATTERN2_COUNT - 1)) for i in range(1, CIRPATTERN2_COUNT)], mode=Mode.SUBTRACT)


solid = part.part
